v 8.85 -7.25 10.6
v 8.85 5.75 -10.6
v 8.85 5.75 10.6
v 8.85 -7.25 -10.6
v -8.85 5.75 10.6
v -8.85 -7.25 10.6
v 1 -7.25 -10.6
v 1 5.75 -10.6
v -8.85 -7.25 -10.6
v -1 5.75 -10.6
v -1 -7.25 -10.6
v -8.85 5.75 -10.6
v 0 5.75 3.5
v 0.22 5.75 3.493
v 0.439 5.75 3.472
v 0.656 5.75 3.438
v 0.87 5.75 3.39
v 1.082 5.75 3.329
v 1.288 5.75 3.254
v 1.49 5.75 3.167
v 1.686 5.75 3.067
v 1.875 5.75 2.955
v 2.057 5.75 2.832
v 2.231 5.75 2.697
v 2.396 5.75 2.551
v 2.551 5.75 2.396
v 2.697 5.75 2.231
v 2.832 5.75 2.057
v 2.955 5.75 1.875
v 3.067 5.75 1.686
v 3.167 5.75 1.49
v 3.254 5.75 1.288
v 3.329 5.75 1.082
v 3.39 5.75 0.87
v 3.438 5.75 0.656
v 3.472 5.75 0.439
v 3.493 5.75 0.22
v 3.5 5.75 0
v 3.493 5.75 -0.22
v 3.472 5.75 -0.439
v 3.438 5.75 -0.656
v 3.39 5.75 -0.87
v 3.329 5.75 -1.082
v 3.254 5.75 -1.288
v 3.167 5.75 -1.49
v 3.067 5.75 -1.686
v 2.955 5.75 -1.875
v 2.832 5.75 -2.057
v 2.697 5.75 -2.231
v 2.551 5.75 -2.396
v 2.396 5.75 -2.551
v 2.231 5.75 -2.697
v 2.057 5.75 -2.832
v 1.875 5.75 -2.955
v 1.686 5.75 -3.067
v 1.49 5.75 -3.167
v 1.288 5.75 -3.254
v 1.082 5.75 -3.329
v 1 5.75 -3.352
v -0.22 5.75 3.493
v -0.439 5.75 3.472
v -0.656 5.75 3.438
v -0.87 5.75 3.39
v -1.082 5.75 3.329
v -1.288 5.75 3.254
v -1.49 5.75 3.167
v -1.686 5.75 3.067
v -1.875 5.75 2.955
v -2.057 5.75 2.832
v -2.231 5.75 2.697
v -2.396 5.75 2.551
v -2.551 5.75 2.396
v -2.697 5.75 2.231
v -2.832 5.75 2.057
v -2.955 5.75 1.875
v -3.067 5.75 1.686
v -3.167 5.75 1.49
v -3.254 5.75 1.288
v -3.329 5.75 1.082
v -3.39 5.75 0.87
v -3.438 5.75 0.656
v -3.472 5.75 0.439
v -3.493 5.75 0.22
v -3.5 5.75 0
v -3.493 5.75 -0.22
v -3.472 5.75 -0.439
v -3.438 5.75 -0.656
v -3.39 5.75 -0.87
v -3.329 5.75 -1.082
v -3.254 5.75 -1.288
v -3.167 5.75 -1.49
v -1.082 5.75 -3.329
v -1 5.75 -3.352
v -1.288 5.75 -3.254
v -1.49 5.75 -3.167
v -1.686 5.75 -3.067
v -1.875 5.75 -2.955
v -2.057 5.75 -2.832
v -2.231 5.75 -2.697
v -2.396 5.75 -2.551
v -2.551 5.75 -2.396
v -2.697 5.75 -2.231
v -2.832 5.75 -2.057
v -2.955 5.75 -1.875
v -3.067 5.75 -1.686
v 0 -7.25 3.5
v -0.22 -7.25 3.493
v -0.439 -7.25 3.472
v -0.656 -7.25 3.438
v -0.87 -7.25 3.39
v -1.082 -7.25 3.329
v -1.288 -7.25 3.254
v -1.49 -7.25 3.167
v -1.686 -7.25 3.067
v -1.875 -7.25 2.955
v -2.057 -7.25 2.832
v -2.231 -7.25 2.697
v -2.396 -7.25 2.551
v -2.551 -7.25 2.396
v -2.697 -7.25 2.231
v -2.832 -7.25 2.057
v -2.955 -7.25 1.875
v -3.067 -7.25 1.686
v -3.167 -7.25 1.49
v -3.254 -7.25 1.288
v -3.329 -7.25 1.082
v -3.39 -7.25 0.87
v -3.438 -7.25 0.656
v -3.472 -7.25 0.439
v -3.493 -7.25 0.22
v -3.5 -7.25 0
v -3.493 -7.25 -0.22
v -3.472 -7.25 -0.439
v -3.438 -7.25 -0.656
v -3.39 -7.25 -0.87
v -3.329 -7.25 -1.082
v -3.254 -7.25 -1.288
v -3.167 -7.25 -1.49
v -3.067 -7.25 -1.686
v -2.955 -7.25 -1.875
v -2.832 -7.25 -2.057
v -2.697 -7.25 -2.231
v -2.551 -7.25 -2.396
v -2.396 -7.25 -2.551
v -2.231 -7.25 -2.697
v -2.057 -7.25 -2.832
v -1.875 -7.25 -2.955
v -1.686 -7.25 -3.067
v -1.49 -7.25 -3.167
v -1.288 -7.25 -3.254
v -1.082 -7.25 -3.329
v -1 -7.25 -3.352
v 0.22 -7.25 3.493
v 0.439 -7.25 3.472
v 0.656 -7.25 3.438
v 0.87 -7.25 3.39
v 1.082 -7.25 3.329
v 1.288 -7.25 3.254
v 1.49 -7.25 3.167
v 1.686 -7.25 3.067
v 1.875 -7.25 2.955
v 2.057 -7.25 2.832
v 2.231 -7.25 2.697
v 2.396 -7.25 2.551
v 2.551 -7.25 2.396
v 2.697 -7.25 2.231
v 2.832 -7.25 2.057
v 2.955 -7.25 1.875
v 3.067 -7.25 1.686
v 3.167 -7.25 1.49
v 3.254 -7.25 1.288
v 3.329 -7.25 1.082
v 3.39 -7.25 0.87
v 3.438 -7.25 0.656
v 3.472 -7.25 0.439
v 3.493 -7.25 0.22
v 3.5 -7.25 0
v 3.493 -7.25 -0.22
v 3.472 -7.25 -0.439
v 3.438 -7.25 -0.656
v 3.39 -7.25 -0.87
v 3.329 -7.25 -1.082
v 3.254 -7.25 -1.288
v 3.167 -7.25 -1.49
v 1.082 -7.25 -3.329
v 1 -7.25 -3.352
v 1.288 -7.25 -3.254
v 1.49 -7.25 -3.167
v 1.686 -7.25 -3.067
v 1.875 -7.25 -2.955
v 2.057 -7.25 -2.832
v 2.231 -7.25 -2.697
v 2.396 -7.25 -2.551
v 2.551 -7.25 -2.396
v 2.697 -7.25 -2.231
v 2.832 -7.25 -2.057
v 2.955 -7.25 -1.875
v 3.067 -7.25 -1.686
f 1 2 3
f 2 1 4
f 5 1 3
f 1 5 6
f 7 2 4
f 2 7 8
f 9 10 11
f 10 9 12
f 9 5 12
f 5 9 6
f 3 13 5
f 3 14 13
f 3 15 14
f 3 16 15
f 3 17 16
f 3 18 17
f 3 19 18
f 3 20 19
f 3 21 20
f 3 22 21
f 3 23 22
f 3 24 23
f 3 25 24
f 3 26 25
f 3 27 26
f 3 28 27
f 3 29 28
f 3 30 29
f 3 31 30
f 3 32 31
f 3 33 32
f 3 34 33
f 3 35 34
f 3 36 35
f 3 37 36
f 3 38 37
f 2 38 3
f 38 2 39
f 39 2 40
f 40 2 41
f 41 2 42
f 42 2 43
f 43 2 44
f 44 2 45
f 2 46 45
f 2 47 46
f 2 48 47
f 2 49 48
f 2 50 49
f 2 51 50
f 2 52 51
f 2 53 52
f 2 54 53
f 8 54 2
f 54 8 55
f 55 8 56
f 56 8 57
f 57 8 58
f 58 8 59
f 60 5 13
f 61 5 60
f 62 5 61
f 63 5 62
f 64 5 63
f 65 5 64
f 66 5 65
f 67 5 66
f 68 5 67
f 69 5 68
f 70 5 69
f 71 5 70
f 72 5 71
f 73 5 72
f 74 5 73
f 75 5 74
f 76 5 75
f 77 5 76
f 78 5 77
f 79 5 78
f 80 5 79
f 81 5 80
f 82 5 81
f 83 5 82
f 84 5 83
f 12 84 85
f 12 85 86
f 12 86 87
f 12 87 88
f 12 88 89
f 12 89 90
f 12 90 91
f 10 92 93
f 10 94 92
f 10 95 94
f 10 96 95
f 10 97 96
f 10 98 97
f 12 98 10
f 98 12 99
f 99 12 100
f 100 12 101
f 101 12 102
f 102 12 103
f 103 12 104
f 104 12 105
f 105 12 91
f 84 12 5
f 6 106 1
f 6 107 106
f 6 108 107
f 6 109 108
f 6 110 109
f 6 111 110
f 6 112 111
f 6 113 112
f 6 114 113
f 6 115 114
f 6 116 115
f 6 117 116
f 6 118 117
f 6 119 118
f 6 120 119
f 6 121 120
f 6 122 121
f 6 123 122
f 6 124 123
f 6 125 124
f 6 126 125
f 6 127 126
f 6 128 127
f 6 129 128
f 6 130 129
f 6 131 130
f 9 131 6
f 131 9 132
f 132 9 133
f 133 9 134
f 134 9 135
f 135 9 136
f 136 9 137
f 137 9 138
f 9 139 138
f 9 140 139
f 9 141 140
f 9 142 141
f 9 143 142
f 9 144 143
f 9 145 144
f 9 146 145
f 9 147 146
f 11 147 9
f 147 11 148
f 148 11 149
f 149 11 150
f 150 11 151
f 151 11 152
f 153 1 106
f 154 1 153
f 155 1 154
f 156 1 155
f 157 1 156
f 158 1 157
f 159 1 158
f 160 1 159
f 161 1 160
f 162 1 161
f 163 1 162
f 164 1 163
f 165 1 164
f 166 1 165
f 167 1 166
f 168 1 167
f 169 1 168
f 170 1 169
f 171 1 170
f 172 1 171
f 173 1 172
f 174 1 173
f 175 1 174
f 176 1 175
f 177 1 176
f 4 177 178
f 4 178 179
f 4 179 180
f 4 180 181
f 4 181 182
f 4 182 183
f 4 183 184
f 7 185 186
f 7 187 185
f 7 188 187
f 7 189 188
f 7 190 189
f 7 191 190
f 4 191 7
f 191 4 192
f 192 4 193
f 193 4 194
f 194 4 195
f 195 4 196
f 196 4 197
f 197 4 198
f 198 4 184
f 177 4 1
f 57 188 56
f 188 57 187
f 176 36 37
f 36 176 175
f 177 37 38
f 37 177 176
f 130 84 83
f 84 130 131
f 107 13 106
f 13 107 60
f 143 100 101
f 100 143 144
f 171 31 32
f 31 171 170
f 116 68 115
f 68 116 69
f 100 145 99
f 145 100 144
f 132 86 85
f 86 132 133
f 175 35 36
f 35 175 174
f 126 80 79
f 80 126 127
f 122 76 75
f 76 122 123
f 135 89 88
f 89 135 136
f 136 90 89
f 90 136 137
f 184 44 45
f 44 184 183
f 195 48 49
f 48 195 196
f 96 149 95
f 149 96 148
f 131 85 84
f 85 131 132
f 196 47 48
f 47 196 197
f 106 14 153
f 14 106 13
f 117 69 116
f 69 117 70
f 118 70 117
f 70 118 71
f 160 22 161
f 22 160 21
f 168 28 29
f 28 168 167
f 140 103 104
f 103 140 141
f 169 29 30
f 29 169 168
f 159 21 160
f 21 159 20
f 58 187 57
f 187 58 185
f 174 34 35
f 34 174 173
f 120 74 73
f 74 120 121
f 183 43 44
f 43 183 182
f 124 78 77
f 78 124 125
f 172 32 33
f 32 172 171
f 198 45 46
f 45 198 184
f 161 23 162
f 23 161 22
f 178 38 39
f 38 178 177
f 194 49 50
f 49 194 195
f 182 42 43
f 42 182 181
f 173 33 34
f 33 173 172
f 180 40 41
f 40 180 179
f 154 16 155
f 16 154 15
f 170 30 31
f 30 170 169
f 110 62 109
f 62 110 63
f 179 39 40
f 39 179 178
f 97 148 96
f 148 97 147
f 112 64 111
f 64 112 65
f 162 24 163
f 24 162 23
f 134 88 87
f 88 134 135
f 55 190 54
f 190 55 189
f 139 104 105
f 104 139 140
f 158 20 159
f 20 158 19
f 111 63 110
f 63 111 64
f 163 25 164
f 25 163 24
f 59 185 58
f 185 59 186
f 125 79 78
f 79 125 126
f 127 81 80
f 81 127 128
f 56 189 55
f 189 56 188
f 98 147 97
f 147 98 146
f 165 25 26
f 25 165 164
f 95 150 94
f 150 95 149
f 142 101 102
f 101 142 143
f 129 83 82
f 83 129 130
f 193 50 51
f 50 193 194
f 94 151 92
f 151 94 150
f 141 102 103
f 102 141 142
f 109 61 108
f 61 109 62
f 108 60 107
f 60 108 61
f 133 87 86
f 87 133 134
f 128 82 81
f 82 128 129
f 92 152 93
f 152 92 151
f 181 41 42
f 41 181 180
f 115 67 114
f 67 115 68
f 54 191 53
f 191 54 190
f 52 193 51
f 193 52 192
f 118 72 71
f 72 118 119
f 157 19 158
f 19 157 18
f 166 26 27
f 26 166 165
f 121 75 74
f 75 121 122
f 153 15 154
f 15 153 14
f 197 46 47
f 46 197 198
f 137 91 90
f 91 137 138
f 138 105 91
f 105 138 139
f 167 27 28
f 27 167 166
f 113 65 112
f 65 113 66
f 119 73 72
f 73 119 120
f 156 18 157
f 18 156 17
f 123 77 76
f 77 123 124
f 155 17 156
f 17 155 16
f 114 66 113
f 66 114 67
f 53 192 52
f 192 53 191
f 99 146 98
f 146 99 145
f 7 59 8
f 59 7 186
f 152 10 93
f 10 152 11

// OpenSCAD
$fn = 100;

// Match the passthrough opening dimensions
opening_width = 18;    // x - from length in main file
opening_height = 21.5; // z - from gap in main file
wall = 12;              // y - depth of the passthrough wall

// Grommet dimensions
tolerance = 0.3;       // shrink outer size for fit
grommet_w = opening_width - tolerance;
grommet_h = opening_height - tolerance;
grommet_depth = wall - 0.5; // slightly thinner than wall

// Cable hole
cable_dia = 7;

// Slit for mid-cable installation (cuts from bottom edge to hole)
slit_width = 2;

// Lip/flange to prevent push-through
lip = 1.5;
lip_depth = 1.5;

difference() {
    union() {
        // Main grommet body
        cube([grommet_w, grommet_depth, grommet_h], center = true);

        // Lip on one face
        translate([0, -(grommet_depth + lip_depth) / 2, 0])
        cube([grommet_w, lip_depth, grommet_h], center = true);
    }

    // Cable hole (through Y axis)
    rotate([90, 0, 0])
    cylinder(d = cable_dia, h = grommet_depth + lip_depth + 2, center = true);

    // Slit from bottom edge to cable hole for mid-cable install
    translate([0, 0, -(grommet_h / 2 + 1) / 2])
    cube([slit_width, grommet_depth + lip_depth + 2, grommet_h / 2 + 1], center = true);
}
